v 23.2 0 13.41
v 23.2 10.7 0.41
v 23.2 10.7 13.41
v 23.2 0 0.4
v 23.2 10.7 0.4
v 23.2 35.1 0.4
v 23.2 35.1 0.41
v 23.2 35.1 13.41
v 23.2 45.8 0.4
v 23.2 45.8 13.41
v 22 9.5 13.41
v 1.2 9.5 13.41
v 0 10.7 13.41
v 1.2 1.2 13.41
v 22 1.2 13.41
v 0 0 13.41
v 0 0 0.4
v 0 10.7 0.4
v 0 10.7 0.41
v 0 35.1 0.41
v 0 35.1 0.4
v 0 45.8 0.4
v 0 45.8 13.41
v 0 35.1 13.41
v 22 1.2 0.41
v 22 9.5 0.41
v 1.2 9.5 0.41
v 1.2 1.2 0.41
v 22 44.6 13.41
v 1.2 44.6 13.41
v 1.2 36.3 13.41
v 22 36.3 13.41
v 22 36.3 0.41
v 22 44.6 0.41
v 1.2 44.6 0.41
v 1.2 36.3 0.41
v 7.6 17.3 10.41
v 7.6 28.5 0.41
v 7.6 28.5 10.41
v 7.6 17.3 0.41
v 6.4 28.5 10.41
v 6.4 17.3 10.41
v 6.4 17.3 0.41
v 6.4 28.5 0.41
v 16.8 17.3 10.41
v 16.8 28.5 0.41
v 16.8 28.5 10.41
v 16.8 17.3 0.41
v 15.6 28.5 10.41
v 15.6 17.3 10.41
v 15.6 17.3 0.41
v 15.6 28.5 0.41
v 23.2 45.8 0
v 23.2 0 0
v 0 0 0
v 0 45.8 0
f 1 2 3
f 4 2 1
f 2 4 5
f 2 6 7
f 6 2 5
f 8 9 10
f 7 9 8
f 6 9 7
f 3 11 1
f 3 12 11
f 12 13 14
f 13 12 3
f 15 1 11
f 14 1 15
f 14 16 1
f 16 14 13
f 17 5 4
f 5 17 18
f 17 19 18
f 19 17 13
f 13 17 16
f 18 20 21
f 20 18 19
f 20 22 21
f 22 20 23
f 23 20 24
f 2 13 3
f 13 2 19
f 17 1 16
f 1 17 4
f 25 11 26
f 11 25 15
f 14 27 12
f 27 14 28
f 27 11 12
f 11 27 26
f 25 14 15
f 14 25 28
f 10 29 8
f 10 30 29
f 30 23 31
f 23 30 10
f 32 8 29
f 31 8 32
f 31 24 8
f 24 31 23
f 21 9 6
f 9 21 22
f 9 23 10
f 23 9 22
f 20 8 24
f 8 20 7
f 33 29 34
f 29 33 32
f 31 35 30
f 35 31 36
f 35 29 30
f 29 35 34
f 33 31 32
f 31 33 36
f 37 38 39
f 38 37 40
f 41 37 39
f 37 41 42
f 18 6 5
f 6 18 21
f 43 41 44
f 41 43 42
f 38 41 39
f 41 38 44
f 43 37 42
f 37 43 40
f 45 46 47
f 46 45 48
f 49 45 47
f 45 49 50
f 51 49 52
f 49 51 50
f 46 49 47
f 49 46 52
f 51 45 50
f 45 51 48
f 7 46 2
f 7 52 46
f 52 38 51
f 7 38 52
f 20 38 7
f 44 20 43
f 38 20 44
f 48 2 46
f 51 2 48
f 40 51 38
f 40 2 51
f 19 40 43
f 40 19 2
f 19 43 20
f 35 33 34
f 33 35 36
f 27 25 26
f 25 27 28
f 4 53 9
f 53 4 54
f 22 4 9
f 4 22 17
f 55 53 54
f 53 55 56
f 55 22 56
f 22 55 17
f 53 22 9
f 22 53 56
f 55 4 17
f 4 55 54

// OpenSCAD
// file: ../../Base/Rotation.scad
// Fischertechnik Box Foundation
// Geometry Helpers Rotation

include <PlacementOptions.scad>

// getRotatedSpace(space, rotation=NoRotation)
// Rotates the space dependent on the specified rotation

function getRotatedSpace(space, rotation=NoRotation) = [
    (rotation == Rotate90 || rotation == Rotate270) ? space.y : space.x,
    (rotation == Rotate90 || rotation == Rotate270) ? space.x : space.y
];

// Rotates the given space around the fixed left lower corner
// space = the space the children needs as width/depth list [width,depth]
// rotation = 0 Rotate0 degrees, 1 Rotate90 degrees, 2 Rotate180 degrees, 3 Rotate270 degrees (equivalent to -90)

module RotateFix(space, rotation=NoRotation) {
    dy = (rotation == Rotate0 || rotation == Rotate270) ? 0 :
        (rotation == Rotate90) ? space.x :
        space.y;
    dx = (rotation < Rotate180) ? 0 :
        (rotation == Rotate180) ? space.x :
        space.y;
    
    translate([dx, dy, 0])
        rotate([0, 0, rotations[rotation]])
            children();
}
// file: ../../Base/Alignment.scad
// Fischertechnik Box Foundation
// Geometry Helpers Alignment

include <PlacementOptions.scad>

// getAlignedX(elementWidth, spaceWidth, align=AlignRight, offset=0)
// Gets the aligned X offset of an element with the given
// width in the given space.
// elementWidth = The width of the element to positon
// spaceWidth = The space where the element should be aligned
// align = 0 AlignLeft, 1 AlignCenter, 2 AlignRight
// offset = an optional offset from the aligned position. When
// aligned left or centered, then positive values are in X direction.
// When aligned right then positive values are in negative X direction.

function getAlignedX(elementWidth, spaceWidth, align=AlignRight, offset=0) =
    (align == AlignLeft) ?
        offset :
        ((align == AlignCenter) ?
        (spaceWidth - elementWidth)/2 + offset :
        spaceWidth - offset - elementWidth);

// getAlignedY(elementDepth, spaceDepth, align=AlignTop, offset=0)
// Gets the aligned Y offset of an element with the given
// depth in the given space.
// elementDepth = The depth of the element to positon
// spaceDepth = The space where the element should be aligned
// align = 0 AlignBottom, 1 AlignCenter, 2 AlignTop
// offset = an optional offset from the aligned position. When
// aligned bottom or centered, then positive values are in Y direction.
// When aligned top then positive values are in negative Y direction.

function getAlignedY(elementDepth, spaceDepth, align=AlignTop, offset=0) =
    (align == AlignBottom) ?
        offset :
        ((align == AlignCenter) ?
        (spaceDepth - elementDepth)/2 + offset :
        spaceDepth - offset - elementDepth);
// file: ../../Base/PlacementOptions.scad
// Fischertechnik Box Foundation
// Placement Options

// Alignment
NoAlign = 0;
AlignLeft = 1;
AlignBottom = 2;
AlignCenter = 3;
AlignRight = 4;
AlignTop = 5;

// Element rotation degree steps
rotations = [0, -90, -180, -270];

// Rotation
NoRotation = 0;
Rotate0 = 0;
Rotate90 = 1;
Rotate180 = 2;
Rotate270 = 3;

// Docking (seen from above)
NoDock = -1;
DockLeft = 0;
DockTop = 1;
DockRight = 2;
DockCorner = 2;
DockBottom = 3;

// Web corners
LowerLeft = 0;
UpperLeft = 1;
UpperRight = 2;
LowerRight = 3;

// Web position relative to corner
LeftOfCorner = 0;
RightOfCorner = 1;
// file: ../../Base/Boxes.scad
// Fischertechnik Box Foundation
// Pre-designed Boxes

use <Constants.scad>

include <PlacementOptions.scad>

box190Width = 190;
box190Depth = 130;
box130Width = 130;
box130Depth = 95;

// Values are from an original ec3 box
topBottomDifference = 1.5;
outerHeight = 40;
innerHeight = 38.2;
baseThickness = outerHeight - innerHeight;
stackExcess = 5.7;
radius = 3.5;
wallThickness = 1.5;
tolerance = 0.2;
stackOffset = innerHeight - stackExcess;

boxUsageHeight = stackOffset;
boxWallThickness = wallThickness;
boxBaseThickness = baseThickness;
boxWebWidth = 3.0;

// getBoxWallThickness()
// Gets the wall thickness of a Fischertechnik Box
function getBoxWallThickness() = boxWallThickness;

// getBoxUsageHeight()
// Gets the usable height of a Fischertechnik box
function getBoxUsageHeight() = boxUsageHeight;

// getBoxInnerHeight()
// Gets the inner height of a Fischertechnik box, including the stack excess
function getBoxInnerHeight() = innerHeight;

// getBoxBaseThickness()
// Gets the thickness of the Fischertechnik box base.
function getBoxBaseThickness() = boxBaseThickness;

// getBoxWebWidth()
// Gets the width of a box web
function getBoxWebWidth() = boxWebWidth;

// getBox190Space()
// Gets the usable inner space of a Box 190 as an x/y-list
function getBox190Space() = [
    box190Width - 2*getBoxWallThickness() - topBottomDifference, 
    box190Depth - 2*getBoxWallThickness() - topBottomDifference ];

// BoxBase(width, depth)
// Creates an empty stackable Fischertechnik compatible box
// width = Outer width of the box (190, 130, ...)
// depth = Outer depth of the box (130, 95, ...)

module BoxBase(width, depth, height=outerHeight) {    
    thinPlate = 0.01;

    innerHeight = height - baseThickness;    
    
    module BodyPlate(width, depth) {
        translate([radius, radius])
        hull() {
            w = width-2*radius;
            d = depth-2*radius;
            cube([w, d, thinPlate]);
            cylinder(thinPlate, r=radius, $fn=getFragments());
            translate([w, 0])
                cylinder(thinPlate, r=radius, $fn=getFragments());
            translate([w, d])
                cylinder(thinPlate, r=radius, $fn=getFragments());
            translate([0, d])
                cylinder(thinPlate, r=radius, $fn=getFragments());
        }
    }
    
    module Body(tolerance=tolerance) {
        hull() {
            // Bottom with tolerance to fit into the original boxes when stacked
            translate([-wallThickness+tolerance, -wallThickness+tolerance, -baseThickness])
                BodyPlate(width-topBottomDifference-2*tolerance, depth-topBottomDifference-2*tolerance);
            
            // Top
            translate([-wallThickness-topBottomDifference/2, -wallThickness-topBottomDifference/2, innerHeight-thinPlate])
                BodyPlate(width, depth);
         }
    }

    module Cutoff() {
        hull() {
            coWidth = width - 2*wallThickness;
            coDepth = depth - 2*wallThickness;
            
            // Bottom
            BodyPlate(coWidth-topBottomDifference, coDepth-topBottomDifference);

            // Top
            translate([-topBottomDifference/2, -topBottomDifference/2, innerHeight+thinPlate]) 
                BodyPlate(coWidth, coDepth);
        }
    }
    
    difference() {        
        Body();
        Cutoff();
        stackOffset = innerHeight - stackExcess;
        translate([0, 0, stackOffset + baseThickness])
            Body(tolerance=0);
    }
}

// Creates the Fischertechnik empty box 130x190 mm and places it at position 0,0
// 190x130 are the outer sizes, the inner space is slightly smaller. Use getBox190Space() to get the inner sizes.
// The box is positioned that the usable inner space is at the 0,0,0 position. The

module Box190() {
    BoxBase(box190Width, box190Depth);
}

// Gets the usable inner space of a Box 130 as an x/y-list
function getBox130Space() = [
    box130Width - 2*getBoxWallThickness() - topBottomDifference, 
    box130Depth - 2*getBoxWallThickness() - topBottomDifference ];

// Creates the Fischertechnik empty box 95x130 mm and places it at position 0,0
// 190x130 are the outer sizes, the inner space is slightly smaller. Use getBox190Space() to get the inner sizes.
// The box is positioned that the usable inner space is at the 0,0,0 position. The

module Box130() {
    BoxBase(box130Width, box130Depth);
}

// Creates a web at the specified box walls
// corner 0 = LowerLeft, 1 = UpperLeft, 2 = UpperRight, 3 = LowerRight
// side 0 = LeftOfCorner, 1 = RightOfCorner
// distance = Distance in mm from the corner
// boxSpace = inner width and depth of the box (default: Box 190)
// webWidth = length of the web (default is 3 mms)
// webThickness = thickness of the web (default is 1 mm)

module BoxWeb(corner, side, distance, boxSpace=getBox190Space(), webWidth=getBoxWebWidth(), webThickness=1.0) {
    sink = getBoxWallThickness()/2;

    width = (corner % 2 == 0) ? 
            (side == LeftOfCorner ? webWidth : webThickness) :
            (side == LeftOfCorner ? webThickness : webWidth);

    depth = (corner % 2 == 0) ? 
            (side == RightOfCorner ? webWidth : webThickness) :
            (side == RightOfCorner ? webThickness : webWidth);
    
    xDiff = corner == LowerLeft ? 
                (side == LeftOfCorner ? -sink : distance) :
            (corner == UpperLeft ?                
                (side == LeftOfCorner ? distance : -sink) :
            (corner == UpperRight ?
                (side == LeftOfCorner ? boxSpace.x-webWidth+sink : boxSpace.x-distance-webThickness) :
                (side == LeftOfCorner ? boxSpace.x-distance-webThickness: boxSpace.x-webWidth+sink)));

    yDiff = corner == LowerLeft ? 
                (side == RightOfCorner ? -sink : distance) :
            (corner == UpperLeft ?
                (side == RightOfCorner ? boxSpace.y-distance : boxSpace.y-webWidth+sink) :
            (corner == UpperRight ?
                (side == RightOfCorner ? boxSpace.y-webWidth+sink : boxSpace.y-distance) :
                (side == RightOfCorner ? distance : -sink)));
    
    translate([xDiff, yDiff, -getExcess()])
        cube([width, depth, boxUsageHeight + 2*getExcess()]);
}
// file: ../../Base/Placement.scad
// Fischertechnik Box Foundation
// Geometry Helpers Placement

use <Constants.scad>
use <Alignment.scad>
use <Rotation.scad>
use <Boxes.scad>

include <PlacementOptions.scad>

// Place(x=0, y=0, elementSpace=[0,0], alignX=AlignLeft, alignY=AlignBottom, rotation=Rotate0, boxSpace=getBox190Space())
// Places the child at the specified position
// y = Y-Position. This is a relative position when an X aligment is specified.
// x = X-Position. This is a relative position when an Y aligment is specified.
// elementSpace = space of the element to be placed [x,y]
// alignX = -1=NoAlign, 0 AlignLeft, 1 AlignCenter, 3 AlignRight (elementSpace and boxSpace required!)
// alignY = -1=NoAlign, 2 AlignBottom, 1 AlignCenter, 4 AlignTop (elementSpace and boxSpace required!)
// rotation = 0 Rotate0 0 degrees, 1 Rotate90 90 degrees, 
// 2 Rotate180 180 degrees, 3 Rotate270 270 degrees (equivalent to -90)
// boxSpace = Inner space of the box where the placement occurs [x,y] - default is Box 190x130 inner space

module Place(x=0, y=0, elementSpace=[0,0], 
  alignX=AlignLeft, alignY=AlignBottom, 
  rotation=NoRotation, boxSpace=getBox190Space()) {

    module Position(x, y, space, rotation=Rotate0) {
        translate([x, y, 0])
            RotateFix(space, rotation)
                children();
    }

    space = getRotatedSpace(elementSpace, rotation);
    alignedX = getAlignedX(space.x, boxSpace.x, alignX, x);
    alignedY = getAlignedY(space.y, boxSpace.y, alignY, y);
    Position(alignedX, alignedY, elementSpace, rotation)
        children();
}

// Center(space=getBox130Space(), elementSpace=[0,0])
// space = Space where the children is centered. For cylinder use centered=true and no elementSpace.
// elementSpace = space of the element to be centered [x,y]

module Center(space=getBox190Space(), elementSpace=[0,0]) {
    Place(elementSpace=elementSpace, boxSpace=space, alignX=AlignCenter, alignY=AlignCenter)
        children();
}

// CenterHorizontal(width=0, y=0, offset=0, space=getBox130Space())
// width = Width of the element to be placed.
// y = Y position of the element
// offset = Offset from the center position (negative will be left of the center)
// space = Space where the element is placed

module CenterHorizontal(width=0, y=0, offset=0, space=getBox190Space()) {
    Place(x=offset, y=y, elementSpace=[width, 0], boxSpace=space, alignX=AlignCenter)
        children(0);
}

// CenterVertical(depth=0, x=0, offset=0, space=getBox130Space())
// depth = Depth of the element to be placed.
// x = X position of the element
// offset = Offset from the center position (negative will be down of the center)
// space = Space where the element is placed

module CenterVertical(depth=0, x=0, offset=0, space=getBox190Space()) {
    Place(x=x, y=offset, elementSpace=[0, depth], boxSpace=space, alignY=AlignCenter)
        children(0);
}

// getIsVertical(align)
// True if the specified alignment needs a vertical orientation for a divider (AlignRight, AlignLeft)

function getIsVertical(align) = (align == AlignRight || align == AlignLeft);

// getIsHorizontal(align)
// True if the specified alignment needs a horizontal orientation for a divider (AlignTop, AlignBottom)

function getIsHorizontal(align) = (align == AlignTop || align == AlignBottom);
// file: ../../Elements/FrameLockingRing.scad
// Fischertechnik Box Library
// Frame for Locking Ring
// 31020

use <../Base/Constants.scad>
use <../ModelBase/Simple.scad>

width = 20;
depth = 7.5;
height = 13;

// getFrameLockingRingSpace(columns=1, rows=1)
// columns = Count of locking rings in X direction (width of ring)
// rows = Count of locking rings in Y direction (depth of ring)
// Gets the space the frame locking ring needs as width (.x and .y as a list)

function getFrameLockingRingSpace(columns=1, rows=1) = getFrameOuterVolume([width*columns, depth*rows, height]);

// FrameLockingRing(columns, rows, smallSideIsX)
// columns = Count of locking rings in X direction (width of ring)
// rows = Count of locking rings in Y direction (depth of ring)
// The walls of the frame are 13 mm high. The small side is 7.5 mm wide, the large side
// is 20 mm wide.

module FrameLockingRing(columns=1, rows=1) {
    Frame([width*columns, depth*rows, height]);
}

// Tests
color("lightgray")
    FrameLockingRing(1);
// file: ../../Elements/HolderWinchDrum.scad
// Fischertechnik Box Library
// Holder for Winch Drum
// 31016

use <../Base/Constants.scad>
use <../Base/Placement.scad>
use <../ModelBase/Simple.scad>

width = 20;
depth = 25;
height = 10;

// getWinchDrumHolderSpace()
// Gets the space the winch drum holder needs as width and depth (.x and .y as a list)

function getHolderWinchDrumSpace() = [width, depth, height];

// HolderWinchDrum()
// Two walls for holding the 31016 winch drum.

module HolderWinchDrum() {
    holderDepth = 11.2;
    holderDistance = 8;
    
    Space(getHolderWinchDrumSpace());
    
    module Holders() {
        Wall([getDividerThickness(), holderDepth, height]);
        translate([holderDistance + getDividerThickness(), 0])
            Wall([getDividerThickness(), holderDepth, height]);
    }
    
    Center(getHolderWinchDrumSpace(), [holderDistance + 2*getDividerThickness(), holderDepth]) {
        Holders();
    }
}

// Tests
color("lightgray")
HolderWinchDrum();
// file: ../../Elements/AxisClip10.scad
// Fischertechnik Box Library
// Axis for clip 10
// 31023

use <../ModelBase/Simple.scad>
use <../Base/Constants.scad>

width = 12;
depth = 12;
height = 23;
upperDiameter = 3.6;
clipHeight = 10;

// getAxisClip10Space()
// Gets the space of a frame for a clip 10 with spring ring (mot2)

function getAxisClip10Space() = [width, depth, height];

// AxisClip10(height, clipHeight)
// Axis for clip 10 with spring ring (mot2)
// height = Height of the complete axis
// clipHeight = Height of the rt for the clip (standard is 10, in mot3 its only 7)

module AxisClip10(height=height, clipHeight=clipHeight) {
    LeveledAxisWithSpace(height, height-clipHeight, getAxisClip10Space(), diameter=upperDiameter);
}

// Tests
color("lightgray")
AxisClip10();
// file: ../../Base/Constants.scad
// Fischertechnik Box Foundation
// Constants

// Constant values necessary for multiple elements

// Base constants
dividerThickness = 1.2;
excess = 0.01;
fragments = 90;
tolerance = 0.8;

// Gets the thickness of a divider 
function getDividerThickness() = dividerThickness;

// Gets the excess that is used to merge walls into each other
function getExcess() = excess;

// Gets amount of fragments of a cylinder
function getFragments() = fragments;

// Gets the inner tolerance of a frame to each side
function getTolerance() = tolerance;


// Fischertechnik specific constants
axisDiameter = 4;
axisBottomDiameter = axisDiameter + 1;
standardEdgeDistance = 2.5;
standardWebDistance = 11.5;
standardCornerLength = 15;
tubeWallFactor = 0.8;
smallPartsFrameHeight = 20;

// Gets axis diameter
function getAxisDiameter() = axisDiameter;

// Gets axis bottom diameter for thicker part at the bottom
function getAxisBottomDiameter() = axisBottomDiameter;

// gets the standard distance to the wall of the box for dockable frames with webs
function getStandardEdgeDistance() = standardEdgeDistance;

// gets the standard distance of each web to the corner of the dockable frame
function getStandardWebDistance() = standardWebDistance;

// gets the standard length of the corner walls of a dockable frame
function getStandardCornerLength() = standardCornerLength;

// gets the wall thickness of a tube.
function getTubeWallThickness() = tubeWallFactor * getDividerThickness();

// gets the frame height for docked small parts boxes.
function getSmallPartsFrameHeight() = smallPartsFrameHeight;
// file: ../../Elements/ComboHolderWinchDrumWithLockingRings.scad
// Fischertechnik Box Library
// Combo Winch Drum with Locking Rings
// 31016 + 2 x 31020

use <../ModelBase/Simple.scad>
use <HolderWinchDrum.scad>
use <FrameLockingRing.scad>

distance = 24.4;

// getComboHolderWinchDrumWithLockingRingsSpace()
// Gets the space the holder winch drum with locking rings needs as width (.x and .y as a list)

function getComboHolderWinchDrumWithLockingRingsSpace() = [
    getFrameLockingRingSpace().x, 
    getFrameLockingRingSpace().y * 2 + distance,
    getFrameLockingRingSpace().z];

// ComboHolderWinchDrumWithLockingRings
// Combination of a winch drum holder with two locking ring holders at both ends

module ComboHolderWinchDrumWithLockingRings() {    
    yOffsetFrame = distance + getFrameLockingRingSpace()[1];
    
    Space(getComboHolderWinchDrumWithLockingRingsSpace());
    
    FrameLockingRing();
    translate([0, yOffsetFrame, 0])
        FrameLockingRing();
    
    xOffset = (getFrameLockingRingSpace()[0] - getHolderWinchDrumSpace()[0]) / 2;
    yOffset = (distance + 2 * getFrameLockingRingSpace()[1] - getHolderWinchDrumSpace()[1]) / 2;
    
    translate([xOffset, yOffset, 0])
        HolderWinchDrum();
}

// Tests
color("lightgray")
ComboHolderWinchDrumWithLockingRings();
// file: ../TestPrint.scad
// 3D Print Test Base

use <../Base/Constants.scad>

use <../Elements/AxisClip10.scad>

module TestPrint(elementSpace) {
    cube([elementSpace.x, elementSpace.y, 0.4]);
    translate([0,0,0.4+getExcess()]) {
        children();
    }
}

TestPrint(getAxisClip10Space())
    AxisClip10();
// main file
// 3D Print Test
// ComboHolderWinchDrumWithLockingRings

use <../TestPrint.scad>
use <../../Elements/ComboHolderWinchDrumWithLockingRings.scad>

TestPrint(getComboHolderWinchDrumWithLockingRingsSpace())
    ComboHolderWinchDrumWithLockingRings();
